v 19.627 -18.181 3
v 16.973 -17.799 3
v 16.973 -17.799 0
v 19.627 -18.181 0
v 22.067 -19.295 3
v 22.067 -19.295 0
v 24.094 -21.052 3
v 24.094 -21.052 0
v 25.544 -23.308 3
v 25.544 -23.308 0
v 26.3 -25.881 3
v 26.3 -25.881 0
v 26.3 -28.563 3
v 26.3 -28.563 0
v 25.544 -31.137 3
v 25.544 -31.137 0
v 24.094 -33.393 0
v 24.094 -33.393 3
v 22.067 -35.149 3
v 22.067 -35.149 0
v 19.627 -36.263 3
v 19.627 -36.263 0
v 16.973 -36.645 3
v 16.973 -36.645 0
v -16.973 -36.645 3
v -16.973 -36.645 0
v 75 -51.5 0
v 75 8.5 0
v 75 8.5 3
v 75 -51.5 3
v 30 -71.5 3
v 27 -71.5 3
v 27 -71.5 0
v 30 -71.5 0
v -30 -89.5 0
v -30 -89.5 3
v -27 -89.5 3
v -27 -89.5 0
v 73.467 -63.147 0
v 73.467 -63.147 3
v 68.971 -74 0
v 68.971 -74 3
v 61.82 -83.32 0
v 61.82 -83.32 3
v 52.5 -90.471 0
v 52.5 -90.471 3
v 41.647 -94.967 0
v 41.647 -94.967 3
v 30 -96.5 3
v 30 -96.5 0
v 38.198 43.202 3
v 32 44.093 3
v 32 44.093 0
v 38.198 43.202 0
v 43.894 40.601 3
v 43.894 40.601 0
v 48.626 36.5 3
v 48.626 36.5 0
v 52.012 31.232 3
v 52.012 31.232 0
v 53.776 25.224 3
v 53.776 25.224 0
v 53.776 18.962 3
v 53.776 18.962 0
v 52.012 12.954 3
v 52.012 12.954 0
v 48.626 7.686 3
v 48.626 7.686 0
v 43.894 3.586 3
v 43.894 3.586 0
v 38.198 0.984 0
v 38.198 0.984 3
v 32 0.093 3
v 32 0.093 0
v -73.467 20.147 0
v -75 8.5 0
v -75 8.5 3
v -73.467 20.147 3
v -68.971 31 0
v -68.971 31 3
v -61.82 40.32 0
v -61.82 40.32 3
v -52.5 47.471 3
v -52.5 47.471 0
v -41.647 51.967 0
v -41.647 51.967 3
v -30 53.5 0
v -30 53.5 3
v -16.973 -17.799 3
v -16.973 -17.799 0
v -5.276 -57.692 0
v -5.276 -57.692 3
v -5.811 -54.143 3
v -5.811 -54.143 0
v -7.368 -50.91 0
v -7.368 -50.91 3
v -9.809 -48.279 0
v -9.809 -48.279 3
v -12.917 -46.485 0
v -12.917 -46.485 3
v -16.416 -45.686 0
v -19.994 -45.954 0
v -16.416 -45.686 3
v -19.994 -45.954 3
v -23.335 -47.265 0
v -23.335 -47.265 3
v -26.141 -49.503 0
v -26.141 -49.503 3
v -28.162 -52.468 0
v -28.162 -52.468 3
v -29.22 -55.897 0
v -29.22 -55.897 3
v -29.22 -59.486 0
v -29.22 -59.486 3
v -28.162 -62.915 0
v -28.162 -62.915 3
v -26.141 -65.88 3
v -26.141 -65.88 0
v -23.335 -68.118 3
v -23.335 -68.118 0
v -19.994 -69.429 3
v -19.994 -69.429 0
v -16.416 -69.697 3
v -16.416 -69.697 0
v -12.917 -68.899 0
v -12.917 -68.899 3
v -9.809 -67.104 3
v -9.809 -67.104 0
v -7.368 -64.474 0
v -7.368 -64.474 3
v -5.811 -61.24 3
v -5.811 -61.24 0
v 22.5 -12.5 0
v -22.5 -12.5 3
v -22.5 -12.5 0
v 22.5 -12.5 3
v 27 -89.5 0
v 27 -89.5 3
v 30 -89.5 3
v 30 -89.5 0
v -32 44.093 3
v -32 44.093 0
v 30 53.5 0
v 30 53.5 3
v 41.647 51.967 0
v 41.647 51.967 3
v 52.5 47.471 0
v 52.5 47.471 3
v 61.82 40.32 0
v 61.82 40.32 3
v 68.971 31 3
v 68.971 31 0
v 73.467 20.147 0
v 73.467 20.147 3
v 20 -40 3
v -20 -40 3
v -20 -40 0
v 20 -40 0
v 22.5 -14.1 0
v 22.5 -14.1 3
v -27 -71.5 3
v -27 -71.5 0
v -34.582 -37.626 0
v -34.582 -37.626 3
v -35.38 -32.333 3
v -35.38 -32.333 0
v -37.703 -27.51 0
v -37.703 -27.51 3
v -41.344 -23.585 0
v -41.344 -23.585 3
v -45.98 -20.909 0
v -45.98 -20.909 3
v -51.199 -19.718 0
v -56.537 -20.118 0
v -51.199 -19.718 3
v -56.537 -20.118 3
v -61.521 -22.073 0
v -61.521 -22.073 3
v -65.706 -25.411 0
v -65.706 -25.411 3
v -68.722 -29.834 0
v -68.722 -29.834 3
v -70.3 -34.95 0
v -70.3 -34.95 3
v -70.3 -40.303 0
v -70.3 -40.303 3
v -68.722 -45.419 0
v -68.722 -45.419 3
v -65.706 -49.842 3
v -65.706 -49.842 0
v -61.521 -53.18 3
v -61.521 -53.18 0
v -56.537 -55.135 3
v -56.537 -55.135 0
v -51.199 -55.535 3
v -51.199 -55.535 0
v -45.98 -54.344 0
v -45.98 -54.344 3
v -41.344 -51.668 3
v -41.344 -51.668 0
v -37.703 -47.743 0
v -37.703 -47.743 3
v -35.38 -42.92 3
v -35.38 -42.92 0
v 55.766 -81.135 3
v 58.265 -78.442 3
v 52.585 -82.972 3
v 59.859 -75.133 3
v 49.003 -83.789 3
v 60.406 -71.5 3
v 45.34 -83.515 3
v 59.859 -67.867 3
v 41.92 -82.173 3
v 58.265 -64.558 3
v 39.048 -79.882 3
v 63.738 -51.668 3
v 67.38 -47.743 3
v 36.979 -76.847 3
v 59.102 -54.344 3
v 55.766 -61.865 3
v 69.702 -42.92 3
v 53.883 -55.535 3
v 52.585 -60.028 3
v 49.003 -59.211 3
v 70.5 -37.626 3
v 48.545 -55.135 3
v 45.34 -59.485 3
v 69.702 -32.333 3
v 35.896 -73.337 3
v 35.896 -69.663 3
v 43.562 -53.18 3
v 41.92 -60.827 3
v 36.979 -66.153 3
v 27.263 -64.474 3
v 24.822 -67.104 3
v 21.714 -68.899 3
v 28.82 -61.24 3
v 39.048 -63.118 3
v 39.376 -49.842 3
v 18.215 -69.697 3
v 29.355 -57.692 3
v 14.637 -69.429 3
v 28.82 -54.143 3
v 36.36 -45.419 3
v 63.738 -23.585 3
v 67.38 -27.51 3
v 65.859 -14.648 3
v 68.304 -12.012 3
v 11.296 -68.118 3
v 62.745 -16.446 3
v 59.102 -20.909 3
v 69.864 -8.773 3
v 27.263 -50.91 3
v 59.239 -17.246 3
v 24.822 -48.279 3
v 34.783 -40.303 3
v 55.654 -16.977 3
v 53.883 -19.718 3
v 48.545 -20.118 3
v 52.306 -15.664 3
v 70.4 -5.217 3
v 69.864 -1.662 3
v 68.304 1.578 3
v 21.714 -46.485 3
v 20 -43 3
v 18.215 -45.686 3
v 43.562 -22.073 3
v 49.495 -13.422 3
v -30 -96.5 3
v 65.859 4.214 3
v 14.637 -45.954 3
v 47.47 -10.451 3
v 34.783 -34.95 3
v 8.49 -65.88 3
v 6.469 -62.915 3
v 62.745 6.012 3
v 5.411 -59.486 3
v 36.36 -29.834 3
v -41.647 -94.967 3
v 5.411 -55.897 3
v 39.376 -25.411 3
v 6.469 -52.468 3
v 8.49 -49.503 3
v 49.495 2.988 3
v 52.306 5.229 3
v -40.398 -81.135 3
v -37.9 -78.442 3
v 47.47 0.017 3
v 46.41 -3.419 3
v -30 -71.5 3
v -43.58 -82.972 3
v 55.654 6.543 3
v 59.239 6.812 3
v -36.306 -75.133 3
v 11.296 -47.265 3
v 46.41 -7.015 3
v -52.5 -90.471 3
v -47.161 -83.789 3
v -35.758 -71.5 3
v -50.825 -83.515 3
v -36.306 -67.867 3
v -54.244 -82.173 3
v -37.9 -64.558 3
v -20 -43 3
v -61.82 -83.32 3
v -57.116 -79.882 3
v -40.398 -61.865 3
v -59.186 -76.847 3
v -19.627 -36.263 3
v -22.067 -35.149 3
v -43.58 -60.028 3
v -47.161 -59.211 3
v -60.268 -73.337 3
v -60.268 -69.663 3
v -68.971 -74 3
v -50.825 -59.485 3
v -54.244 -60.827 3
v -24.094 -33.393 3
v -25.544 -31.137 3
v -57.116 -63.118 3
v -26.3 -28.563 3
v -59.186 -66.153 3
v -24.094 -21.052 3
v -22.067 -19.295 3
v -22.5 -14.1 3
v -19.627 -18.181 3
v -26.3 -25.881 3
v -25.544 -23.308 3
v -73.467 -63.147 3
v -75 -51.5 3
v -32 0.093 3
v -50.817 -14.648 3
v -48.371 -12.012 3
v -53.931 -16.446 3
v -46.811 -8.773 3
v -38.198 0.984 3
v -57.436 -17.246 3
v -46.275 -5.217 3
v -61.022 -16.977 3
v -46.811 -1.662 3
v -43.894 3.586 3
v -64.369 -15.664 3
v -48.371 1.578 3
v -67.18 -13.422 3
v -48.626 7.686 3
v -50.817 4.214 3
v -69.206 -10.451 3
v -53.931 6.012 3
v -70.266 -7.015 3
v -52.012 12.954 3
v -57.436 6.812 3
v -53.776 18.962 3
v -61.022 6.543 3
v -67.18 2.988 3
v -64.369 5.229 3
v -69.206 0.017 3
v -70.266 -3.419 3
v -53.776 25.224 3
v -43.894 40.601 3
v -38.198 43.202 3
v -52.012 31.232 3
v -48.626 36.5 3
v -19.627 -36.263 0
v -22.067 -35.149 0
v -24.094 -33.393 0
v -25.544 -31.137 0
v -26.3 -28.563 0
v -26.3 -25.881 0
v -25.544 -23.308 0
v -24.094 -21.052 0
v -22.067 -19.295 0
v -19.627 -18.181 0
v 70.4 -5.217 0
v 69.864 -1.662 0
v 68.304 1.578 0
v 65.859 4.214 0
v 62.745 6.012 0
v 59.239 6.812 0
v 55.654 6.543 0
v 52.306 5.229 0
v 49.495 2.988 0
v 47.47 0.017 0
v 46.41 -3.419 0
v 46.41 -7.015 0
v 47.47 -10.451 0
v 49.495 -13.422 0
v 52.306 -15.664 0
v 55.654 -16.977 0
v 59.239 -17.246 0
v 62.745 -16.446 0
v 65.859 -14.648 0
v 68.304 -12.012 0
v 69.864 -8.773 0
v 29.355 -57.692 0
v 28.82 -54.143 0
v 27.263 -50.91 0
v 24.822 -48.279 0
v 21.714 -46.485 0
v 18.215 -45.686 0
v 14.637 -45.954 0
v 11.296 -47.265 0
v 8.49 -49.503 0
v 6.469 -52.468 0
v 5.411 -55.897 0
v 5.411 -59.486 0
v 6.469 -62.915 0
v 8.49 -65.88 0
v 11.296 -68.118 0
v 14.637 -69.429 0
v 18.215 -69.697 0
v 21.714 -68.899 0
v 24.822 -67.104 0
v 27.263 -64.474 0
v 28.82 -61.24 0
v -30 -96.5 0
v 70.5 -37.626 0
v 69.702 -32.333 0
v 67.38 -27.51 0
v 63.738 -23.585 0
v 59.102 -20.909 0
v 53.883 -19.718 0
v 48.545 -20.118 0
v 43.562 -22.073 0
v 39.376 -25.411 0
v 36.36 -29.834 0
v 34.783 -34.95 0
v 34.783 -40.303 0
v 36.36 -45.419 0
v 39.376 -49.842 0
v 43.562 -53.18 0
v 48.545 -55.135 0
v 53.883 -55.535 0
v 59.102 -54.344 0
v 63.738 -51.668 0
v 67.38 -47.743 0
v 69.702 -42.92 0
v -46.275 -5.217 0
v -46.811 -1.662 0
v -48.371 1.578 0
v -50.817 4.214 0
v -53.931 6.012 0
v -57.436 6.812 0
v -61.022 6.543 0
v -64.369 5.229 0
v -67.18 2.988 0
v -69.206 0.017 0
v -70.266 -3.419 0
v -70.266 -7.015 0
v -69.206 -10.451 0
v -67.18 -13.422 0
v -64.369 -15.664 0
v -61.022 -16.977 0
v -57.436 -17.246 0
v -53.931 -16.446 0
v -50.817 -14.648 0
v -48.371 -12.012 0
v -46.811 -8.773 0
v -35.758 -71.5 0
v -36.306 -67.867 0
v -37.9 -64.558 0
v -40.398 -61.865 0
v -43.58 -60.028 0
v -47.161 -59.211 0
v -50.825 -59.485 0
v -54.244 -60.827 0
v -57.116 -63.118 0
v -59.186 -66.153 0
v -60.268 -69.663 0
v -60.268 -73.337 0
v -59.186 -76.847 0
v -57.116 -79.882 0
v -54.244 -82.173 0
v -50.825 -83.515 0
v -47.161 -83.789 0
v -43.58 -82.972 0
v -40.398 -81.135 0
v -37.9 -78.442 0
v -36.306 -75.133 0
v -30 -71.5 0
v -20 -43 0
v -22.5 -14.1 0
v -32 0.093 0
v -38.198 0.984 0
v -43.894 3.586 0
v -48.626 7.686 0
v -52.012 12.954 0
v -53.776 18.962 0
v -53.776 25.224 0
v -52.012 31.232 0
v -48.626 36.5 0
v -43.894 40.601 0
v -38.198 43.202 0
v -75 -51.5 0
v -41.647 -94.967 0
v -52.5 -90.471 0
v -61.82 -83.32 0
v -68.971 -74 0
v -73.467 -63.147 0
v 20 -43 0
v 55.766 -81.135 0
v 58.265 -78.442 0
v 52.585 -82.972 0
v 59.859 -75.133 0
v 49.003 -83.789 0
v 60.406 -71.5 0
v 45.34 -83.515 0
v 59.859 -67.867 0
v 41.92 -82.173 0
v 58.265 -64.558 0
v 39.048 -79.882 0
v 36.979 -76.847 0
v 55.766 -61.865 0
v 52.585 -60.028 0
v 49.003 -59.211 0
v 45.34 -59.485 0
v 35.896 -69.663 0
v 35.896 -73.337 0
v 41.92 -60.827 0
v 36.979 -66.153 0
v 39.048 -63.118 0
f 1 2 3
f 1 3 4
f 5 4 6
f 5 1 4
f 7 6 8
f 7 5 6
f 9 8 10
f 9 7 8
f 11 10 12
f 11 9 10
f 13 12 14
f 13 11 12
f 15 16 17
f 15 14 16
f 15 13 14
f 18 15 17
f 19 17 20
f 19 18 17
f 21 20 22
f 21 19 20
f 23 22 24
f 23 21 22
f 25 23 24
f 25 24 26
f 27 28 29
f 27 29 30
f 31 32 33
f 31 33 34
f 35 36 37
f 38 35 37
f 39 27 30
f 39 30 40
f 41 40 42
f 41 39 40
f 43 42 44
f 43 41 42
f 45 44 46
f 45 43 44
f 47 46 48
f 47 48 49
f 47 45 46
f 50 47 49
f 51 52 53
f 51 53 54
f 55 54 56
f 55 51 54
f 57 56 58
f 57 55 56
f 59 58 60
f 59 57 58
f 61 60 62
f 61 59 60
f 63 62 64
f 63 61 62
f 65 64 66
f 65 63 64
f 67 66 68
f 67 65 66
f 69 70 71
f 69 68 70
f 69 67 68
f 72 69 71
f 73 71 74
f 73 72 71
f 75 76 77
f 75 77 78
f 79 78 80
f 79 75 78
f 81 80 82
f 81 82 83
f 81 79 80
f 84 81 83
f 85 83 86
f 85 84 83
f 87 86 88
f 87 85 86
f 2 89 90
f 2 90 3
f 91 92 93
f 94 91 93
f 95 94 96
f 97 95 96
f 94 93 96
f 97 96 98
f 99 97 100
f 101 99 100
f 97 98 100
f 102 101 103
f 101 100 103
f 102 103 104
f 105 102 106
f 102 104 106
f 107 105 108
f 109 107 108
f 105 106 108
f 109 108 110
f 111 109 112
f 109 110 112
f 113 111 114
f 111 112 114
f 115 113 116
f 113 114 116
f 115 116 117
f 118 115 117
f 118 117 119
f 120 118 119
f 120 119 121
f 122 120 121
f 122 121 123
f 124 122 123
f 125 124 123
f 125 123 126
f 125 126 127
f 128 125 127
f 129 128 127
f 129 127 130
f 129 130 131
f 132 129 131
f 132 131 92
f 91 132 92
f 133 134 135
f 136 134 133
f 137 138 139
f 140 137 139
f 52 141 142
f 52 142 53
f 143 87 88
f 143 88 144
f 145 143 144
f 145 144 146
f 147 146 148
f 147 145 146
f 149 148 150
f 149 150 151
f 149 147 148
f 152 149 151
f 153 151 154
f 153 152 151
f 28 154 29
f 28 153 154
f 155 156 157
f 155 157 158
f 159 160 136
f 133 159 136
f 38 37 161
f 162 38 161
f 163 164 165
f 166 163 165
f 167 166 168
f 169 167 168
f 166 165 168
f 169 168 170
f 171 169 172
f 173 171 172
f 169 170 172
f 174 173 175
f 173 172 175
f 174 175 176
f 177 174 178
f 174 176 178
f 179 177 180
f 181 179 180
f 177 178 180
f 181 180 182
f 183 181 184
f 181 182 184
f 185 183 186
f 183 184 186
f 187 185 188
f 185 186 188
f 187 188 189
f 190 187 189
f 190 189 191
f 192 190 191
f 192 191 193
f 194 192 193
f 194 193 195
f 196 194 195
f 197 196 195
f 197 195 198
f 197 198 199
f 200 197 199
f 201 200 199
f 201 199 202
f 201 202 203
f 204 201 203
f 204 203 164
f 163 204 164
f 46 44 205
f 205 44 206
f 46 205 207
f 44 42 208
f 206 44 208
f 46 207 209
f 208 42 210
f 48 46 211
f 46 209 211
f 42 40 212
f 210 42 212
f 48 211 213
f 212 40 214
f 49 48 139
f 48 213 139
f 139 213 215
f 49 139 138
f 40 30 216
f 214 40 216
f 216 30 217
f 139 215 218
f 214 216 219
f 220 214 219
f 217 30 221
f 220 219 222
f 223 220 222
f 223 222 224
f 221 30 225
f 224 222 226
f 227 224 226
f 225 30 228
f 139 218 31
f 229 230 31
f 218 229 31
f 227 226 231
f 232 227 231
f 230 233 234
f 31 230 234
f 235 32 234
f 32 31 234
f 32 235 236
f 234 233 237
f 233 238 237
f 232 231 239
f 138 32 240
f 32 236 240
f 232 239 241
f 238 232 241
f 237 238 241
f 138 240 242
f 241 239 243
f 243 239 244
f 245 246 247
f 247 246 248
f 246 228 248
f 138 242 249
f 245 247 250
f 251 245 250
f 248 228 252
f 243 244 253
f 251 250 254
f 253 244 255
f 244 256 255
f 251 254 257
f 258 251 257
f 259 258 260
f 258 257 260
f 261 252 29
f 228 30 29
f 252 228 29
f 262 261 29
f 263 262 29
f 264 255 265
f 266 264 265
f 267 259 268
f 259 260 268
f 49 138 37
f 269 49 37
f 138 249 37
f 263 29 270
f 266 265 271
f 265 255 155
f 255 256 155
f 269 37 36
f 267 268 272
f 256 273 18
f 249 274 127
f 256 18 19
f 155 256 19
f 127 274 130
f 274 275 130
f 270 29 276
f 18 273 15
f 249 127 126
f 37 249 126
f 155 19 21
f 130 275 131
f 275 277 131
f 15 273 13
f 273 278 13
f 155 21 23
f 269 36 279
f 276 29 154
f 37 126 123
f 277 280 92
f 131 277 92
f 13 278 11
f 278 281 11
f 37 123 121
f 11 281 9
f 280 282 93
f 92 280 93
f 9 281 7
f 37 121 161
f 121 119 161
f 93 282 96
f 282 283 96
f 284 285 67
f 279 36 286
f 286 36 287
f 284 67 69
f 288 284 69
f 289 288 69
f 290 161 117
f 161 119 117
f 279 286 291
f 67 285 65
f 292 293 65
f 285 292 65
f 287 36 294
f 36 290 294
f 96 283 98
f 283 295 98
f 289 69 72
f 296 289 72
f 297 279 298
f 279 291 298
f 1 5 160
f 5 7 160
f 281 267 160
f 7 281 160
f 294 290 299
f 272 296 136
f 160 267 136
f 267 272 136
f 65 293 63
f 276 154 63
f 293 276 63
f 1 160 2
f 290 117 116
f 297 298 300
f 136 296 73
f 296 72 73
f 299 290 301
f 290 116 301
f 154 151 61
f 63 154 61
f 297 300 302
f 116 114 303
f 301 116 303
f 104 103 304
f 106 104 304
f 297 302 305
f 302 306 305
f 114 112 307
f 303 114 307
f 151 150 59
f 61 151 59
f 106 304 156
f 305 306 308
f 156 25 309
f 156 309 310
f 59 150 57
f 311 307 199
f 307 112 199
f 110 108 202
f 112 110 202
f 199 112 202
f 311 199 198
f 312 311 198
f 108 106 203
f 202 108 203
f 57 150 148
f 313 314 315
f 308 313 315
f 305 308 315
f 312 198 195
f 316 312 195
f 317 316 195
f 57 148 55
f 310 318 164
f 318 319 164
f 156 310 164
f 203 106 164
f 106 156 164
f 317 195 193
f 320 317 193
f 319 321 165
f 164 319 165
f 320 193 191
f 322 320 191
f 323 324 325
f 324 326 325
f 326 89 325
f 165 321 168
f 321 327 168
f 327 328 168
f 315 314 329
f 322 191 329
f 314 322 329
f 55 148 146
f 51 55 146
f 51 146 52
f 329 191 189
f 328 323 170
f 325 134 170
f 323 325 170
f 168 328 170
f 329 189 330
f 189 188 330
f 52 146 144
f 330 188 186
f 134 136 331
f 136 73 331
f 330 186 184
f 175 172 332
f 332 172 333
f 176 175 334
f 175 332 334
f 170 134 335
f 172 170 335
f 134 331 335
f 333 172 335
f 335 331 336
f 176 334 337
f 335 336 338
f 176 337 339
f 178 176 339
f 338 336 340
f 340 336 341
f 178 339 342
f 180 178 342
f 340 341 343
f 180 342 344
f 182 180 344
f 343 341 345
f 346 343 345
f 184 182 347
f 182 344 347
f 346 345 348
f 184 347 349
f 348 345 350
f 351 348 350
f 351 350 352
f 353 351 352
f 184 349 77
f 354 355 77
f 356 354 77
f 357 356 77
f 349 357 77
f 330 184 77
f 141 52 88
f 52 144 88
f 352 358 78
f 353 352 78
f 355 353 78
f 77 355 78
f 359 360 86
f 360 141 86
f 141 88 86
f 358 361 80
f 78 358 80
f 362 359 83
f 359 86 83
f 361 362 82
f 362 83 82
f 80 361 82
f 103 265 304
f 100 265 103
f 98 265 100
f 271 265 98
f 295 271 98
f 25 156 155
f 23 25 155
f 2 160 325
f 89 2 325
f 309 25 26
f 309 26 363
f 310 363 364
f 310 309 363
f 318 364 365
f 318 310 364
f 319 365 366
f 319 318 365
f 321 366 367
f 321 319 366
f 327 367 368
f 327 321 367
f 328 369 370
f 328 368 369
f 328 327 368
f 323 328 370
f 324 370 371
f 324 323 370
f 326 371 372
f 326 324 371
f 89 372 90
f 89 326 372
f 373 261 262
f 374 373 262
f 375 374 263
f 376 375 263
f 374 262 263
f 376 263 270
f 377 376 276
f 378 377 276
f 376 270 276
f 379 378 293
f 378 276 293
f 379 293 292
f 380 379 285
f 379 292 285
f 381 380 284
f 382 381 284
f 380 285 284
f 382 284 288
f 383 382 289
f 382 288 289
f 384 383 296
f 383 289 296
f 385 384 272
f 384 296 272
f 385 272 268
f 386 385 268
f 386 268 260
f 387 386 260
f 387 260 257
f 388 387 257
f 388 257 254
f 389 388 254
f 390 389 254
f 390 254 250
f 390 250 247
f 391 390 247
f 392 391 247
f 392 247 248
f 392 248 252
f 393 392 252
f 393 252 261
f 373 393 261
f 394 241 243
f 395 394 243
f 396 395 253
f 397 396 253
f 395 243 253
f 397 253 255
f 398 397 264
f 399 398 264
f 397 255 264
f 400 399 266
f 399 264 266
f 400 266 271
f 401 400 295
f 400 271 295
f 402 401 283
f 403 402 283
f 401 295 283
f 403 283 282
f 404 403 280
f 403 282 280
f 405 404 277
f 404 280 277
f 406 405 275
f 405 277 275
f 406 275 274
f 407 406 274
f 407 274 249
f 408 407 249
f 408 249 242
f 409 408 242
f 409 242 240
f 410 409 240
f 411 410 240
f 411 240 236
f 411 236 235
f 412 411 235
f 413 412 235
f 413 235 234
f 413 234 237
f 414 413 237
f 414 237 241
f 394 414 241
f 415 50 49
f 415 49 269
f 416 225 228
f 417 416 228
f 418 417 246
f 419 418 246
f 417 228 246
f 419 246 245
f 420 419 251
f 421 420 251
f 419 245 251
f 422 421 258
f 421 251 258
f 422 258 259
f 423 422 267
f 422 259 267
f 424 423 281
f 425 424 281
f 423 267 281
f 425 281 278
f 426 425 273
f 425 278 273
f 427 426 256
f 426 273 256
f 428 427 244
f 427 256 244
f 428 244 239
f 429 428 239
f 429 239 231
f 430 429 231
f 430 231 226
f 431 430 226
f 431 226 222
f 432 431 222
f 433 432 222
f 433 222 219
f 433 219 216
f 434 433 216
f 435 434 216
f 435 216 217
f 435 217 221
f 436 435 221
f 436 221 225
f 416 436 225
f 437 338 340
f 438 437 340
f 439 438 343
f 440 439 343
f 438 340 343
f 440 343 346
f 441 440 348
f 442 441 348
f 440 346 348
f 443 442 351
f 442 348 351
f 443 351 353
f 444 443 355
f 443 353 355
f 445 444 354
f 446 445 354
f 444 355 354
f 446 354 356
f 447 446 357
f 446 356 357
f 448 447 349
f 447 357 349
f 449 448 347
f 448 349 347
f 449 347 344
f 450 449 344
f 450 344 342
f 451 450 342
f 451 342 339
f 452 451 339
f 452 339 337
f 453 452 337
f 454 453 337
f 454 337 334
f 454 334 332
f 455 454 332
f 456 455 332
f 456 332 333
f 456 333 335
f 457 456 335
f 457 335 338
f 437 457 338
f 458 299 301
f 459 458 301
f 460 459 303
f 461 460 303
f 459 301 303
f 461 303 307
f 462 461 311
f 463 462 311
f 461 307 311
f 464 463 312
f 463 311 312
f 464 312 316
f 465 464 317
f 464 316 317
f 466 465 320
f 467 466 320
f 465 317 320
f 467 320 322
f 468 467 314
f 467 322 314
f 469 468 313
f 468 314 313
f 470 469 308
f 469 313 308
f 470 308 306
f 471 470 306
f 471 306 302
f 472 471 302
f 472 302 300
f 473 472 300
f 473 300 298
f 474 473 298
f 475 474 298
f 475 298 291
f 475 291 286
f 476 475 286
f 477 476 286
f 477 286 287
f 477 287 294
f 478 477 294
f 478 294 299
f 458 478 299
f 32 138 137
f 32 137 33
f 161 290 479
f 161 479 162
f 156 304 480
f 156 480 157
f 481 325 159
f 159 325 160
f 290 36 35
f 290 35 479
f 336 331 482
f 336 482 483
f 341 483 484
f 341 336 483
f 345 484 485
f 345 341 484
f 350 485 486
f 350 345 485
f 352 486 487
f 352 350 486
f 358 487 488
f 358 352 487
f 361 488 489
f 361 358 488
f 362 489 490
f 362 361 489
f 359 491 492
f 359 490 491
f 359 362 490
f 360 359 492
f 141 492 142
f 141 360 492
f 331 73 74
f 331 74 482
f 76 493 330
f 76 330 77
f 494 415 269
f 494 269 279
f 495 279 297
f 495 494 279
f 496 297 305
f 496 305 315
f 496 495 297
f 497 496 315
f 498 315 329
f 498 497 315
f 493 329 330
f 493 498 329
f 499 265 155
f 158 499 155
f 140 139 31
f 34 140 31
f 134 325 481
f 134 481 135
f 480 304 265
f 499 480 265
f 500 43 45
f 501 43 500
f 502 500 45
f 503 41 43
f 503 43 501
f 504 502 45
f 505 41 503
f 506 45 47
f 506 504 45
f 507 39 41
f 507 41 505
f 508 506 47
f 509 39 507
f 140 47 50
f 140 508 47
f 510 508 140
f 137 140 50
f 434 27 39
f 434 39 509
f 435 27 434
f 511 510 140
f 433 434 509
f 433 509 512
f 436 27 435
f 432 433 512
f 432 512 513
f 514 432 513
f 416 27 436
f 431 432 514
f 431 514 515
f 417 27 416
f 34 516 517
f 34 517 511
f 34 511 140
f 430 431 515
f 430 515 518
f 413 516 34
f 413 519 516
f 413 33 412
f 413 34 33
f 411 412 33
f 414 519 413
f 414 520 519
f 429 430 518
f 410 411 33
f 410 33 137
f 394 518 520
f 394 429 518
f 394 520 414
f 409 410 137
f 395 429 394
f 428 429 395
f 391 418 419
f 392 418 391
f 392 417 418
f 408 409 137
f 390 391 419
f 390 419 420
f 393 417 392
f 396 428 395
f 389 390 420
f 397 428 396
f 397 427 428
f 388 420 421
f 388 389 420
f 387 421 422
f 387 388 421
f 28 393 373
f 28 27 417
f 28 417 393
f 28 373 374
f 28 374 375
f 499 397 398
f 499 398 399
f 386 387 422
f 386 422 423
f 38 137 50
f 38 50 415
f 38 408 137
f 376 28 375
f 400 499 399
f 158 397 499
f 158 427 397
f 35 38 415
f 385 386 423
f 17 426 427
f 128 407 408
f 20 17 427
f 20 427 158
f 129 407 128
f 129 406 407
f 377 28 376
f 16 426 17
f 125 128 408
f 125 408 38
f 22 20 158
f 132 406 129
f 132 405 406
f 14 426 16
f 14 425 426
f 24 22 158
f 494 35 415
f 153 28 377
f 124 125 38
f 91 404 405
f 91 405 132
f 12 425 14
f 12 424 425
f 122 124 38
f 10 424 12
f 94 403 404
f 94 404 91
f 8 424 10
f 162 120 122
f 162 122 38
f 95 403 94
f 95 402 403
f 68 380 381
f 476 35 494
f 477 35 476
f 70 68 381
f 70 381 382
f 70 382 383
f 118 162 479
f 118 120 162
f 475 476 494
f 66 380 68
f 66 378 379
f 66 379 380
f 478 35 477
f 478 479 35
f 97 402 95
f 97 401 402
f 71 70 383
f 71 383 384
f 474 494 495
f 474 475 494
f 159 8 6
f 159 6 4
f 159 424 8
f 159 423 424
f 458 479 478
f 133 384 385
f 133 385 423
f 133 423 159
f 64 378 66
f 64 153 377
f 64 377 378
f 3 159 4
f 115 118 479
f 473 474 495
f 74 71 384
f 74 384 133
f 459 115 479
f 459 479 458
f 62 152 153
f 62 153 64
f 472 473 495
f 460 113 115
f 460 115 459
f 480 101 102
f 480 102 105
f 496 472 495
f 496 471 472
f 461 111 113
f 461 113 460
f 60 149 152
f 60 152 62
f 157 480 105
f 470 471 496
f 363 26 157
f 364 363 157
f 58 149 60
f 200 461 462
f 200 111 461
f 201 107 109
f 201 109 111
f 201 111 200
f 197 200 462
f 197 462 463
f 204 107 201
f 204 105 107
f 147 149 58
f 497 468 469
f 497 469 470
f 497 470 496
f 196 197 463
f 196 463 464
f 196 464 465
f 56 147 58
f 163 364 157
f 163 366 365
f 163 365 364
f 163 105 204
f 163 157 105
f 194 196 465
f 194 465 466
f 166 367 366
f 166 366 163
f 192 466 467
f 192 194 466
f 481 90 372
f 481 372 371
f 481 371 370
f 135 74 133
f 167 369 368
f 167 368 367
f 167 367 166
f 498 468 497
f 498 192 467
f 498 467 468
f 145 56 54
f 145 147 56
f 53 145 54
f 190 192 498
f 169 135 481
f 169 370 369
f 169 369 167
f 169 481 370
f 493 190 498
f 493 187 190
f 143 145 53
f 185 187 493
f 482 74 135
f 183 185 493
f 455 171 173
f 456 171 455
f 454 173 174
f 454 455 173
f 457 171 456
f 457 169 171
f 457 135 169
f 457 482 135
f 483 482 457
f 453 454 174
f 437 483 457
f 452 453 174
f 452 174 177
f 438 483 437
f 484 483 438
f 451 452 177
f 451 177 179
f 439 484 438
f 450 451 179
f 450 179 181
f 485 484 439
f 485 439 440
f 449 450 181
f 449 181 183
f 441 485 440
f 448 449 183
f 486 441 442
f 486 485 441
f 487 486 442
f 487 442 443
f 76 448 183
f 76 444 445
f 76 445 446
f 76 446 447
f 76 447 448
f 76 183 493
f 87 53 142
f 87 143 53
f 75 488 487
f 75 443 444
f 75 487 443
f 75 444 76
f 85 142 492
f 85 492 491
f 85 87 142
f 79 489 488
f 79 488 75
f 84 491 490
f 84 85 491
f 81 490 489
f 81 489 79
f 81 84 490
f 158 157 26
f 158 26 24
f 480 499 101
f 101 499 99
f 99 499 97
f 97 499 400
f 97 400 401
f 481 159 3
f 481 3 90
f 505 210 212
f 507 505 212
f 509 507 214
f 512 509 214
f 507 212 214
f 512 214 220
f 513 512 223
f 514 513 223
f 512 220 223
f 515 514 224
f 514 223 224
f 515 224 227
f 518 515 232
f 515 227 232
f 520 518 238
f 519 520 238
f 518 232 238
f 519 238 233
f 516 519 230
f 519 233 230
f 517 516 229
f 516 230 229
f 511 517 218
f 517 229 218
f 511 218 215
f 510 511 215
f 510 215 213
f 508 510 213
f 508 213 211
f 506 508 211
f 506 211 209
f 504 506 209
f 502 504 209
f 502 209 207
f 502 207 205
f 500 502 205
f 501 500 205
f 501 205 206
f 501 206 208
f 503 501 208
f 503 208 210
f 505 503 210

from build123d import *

# Parameters (mm, degrees)
BOSS_EXTRUDE1_DEPTH = 3
SKETCH2_R           = 12.039123234
SKETCH2_R_2         = 12.323940374
SKETCH2_R_3         = 12.062522367
SKETCH2_R_4         = 17.95917031
SKETCH2_W           = 3
SKETCH2_H           = 18
SKETCH2_W_2         = 45
SKETCH2_H_2         = 1.6
SKETCH2_W_3         = 40
SKETCH2_H_3         = 3
CUT_EXTRUDE1_DEPTH  = 10


with BuildPart() as part:
    # Sketch1 → Boss-Extrude1 (new body)
    with BuildSketch(Plane.XY):
        with BuildLine():
            Line((-30, 53.5), (30, 53.5))
            ThreePointArc((30, 53.5), (61.819805153, 40.319805153), (75, 8.5))
            Line((75, 8.5), (75, -51.5))
            ThreePointArc((75, -51.5), (61.819805153, -83.319805153), (30, -96.5))
            Line((30, -96.5), (0.5, -96.5))
            Line((0.5, -96.5), (-0.5, -96.5))
            Line((-0.5, -96.5), (-30, -96.5))
            ThreePointArc((-30, -96.5), (-61.819805153, -83.319805153), (-75, -51.5))
            Line((-75, -51.5), (-75, 8.5))
            ThreePointArc((-75, 8.5), (-61.819805153, 40.319805153), (-30, 53.5))
        make_face()
    extrude(amount=BOSS_EXTRUDE1_DEPTH)

    # Sketch2 → Cut-Extrude1 (cut)
    with BuildSketch(Plane.XY.offset(3)):
        with Locations((-17.315529095, -57.691685277)):
            Circle(SKETCH2_R)
        with Locations((-48.082177359, -71.5)):
            Circle(SKETCH2_R_2)
        with Locations((48.082177359, -71.5)):
            Circle(SKETCH2_R_2)
        with Locations((17.315529095, -57.691685277)):
            Circle(SKETCH2_R)
        with Locations((-58.337726781, -5.217073599)):
            Circle(SKETCH2_R_3)
        with Locations((-52.54111189, -37.626479887)):
            Circle(SKETCH2_R_4)
        with Locations((52.54111189, -37.626479887)):
            Circle(SKETCH2_R_4)
        with Locations((58.337726781, -5.217073599)):
            Circle(SKETCH2_R_3)
        with Locations((-28.5, -80.5)):
            Rectangle(SKETCH2_W, SKETCH2_H)
        with Locations((28.5, -80.5)):
            Rectangle(SKETCH2_W, SKETCH2_H)
        with Locations((0, -13.3)):
            Rectangle(SKETCH2_W_2, SKETCH2_H_2)
        with Locations((0, -41.5)):
            Rectangle(SKETCH2_W_3, SKETCH2_H_3)
        with BuildLine():
            Line((-32, 44.093276202), (32, 44.093276202))
            ThreePointArc((32, 44.093276202), (54, 22.093276202), (32, 0.093276202))
            Line((32, 0.093276202), (-32, 0.093276202))
            ThreePointArc((-32, 0.093276202), (-54, 22.093276202), (-32, 44.093276202))
        make_face()
        with BuildLine():
            Line((-16.972534131, -17.799407518), (16.972534131, -17.799407518))
            ThreePointArc((16.972534131, -17.799407518), (26.395425928, -27.222299315), (16.972534131, -36.645191111))
            Line((16.972534131, -36.645191111), (-16.972534131, -36.645191111))
            ThreePointArc((-16.972534131, -36.645191111), (-26.395425928, -27.222299315), (-16.972534131, -17.799407518))
        make_face()
    extrude(amount=-CUT_EXTRUDE1_DEPTH, mode=Mode.SUBTRACT)


solid = part.part
